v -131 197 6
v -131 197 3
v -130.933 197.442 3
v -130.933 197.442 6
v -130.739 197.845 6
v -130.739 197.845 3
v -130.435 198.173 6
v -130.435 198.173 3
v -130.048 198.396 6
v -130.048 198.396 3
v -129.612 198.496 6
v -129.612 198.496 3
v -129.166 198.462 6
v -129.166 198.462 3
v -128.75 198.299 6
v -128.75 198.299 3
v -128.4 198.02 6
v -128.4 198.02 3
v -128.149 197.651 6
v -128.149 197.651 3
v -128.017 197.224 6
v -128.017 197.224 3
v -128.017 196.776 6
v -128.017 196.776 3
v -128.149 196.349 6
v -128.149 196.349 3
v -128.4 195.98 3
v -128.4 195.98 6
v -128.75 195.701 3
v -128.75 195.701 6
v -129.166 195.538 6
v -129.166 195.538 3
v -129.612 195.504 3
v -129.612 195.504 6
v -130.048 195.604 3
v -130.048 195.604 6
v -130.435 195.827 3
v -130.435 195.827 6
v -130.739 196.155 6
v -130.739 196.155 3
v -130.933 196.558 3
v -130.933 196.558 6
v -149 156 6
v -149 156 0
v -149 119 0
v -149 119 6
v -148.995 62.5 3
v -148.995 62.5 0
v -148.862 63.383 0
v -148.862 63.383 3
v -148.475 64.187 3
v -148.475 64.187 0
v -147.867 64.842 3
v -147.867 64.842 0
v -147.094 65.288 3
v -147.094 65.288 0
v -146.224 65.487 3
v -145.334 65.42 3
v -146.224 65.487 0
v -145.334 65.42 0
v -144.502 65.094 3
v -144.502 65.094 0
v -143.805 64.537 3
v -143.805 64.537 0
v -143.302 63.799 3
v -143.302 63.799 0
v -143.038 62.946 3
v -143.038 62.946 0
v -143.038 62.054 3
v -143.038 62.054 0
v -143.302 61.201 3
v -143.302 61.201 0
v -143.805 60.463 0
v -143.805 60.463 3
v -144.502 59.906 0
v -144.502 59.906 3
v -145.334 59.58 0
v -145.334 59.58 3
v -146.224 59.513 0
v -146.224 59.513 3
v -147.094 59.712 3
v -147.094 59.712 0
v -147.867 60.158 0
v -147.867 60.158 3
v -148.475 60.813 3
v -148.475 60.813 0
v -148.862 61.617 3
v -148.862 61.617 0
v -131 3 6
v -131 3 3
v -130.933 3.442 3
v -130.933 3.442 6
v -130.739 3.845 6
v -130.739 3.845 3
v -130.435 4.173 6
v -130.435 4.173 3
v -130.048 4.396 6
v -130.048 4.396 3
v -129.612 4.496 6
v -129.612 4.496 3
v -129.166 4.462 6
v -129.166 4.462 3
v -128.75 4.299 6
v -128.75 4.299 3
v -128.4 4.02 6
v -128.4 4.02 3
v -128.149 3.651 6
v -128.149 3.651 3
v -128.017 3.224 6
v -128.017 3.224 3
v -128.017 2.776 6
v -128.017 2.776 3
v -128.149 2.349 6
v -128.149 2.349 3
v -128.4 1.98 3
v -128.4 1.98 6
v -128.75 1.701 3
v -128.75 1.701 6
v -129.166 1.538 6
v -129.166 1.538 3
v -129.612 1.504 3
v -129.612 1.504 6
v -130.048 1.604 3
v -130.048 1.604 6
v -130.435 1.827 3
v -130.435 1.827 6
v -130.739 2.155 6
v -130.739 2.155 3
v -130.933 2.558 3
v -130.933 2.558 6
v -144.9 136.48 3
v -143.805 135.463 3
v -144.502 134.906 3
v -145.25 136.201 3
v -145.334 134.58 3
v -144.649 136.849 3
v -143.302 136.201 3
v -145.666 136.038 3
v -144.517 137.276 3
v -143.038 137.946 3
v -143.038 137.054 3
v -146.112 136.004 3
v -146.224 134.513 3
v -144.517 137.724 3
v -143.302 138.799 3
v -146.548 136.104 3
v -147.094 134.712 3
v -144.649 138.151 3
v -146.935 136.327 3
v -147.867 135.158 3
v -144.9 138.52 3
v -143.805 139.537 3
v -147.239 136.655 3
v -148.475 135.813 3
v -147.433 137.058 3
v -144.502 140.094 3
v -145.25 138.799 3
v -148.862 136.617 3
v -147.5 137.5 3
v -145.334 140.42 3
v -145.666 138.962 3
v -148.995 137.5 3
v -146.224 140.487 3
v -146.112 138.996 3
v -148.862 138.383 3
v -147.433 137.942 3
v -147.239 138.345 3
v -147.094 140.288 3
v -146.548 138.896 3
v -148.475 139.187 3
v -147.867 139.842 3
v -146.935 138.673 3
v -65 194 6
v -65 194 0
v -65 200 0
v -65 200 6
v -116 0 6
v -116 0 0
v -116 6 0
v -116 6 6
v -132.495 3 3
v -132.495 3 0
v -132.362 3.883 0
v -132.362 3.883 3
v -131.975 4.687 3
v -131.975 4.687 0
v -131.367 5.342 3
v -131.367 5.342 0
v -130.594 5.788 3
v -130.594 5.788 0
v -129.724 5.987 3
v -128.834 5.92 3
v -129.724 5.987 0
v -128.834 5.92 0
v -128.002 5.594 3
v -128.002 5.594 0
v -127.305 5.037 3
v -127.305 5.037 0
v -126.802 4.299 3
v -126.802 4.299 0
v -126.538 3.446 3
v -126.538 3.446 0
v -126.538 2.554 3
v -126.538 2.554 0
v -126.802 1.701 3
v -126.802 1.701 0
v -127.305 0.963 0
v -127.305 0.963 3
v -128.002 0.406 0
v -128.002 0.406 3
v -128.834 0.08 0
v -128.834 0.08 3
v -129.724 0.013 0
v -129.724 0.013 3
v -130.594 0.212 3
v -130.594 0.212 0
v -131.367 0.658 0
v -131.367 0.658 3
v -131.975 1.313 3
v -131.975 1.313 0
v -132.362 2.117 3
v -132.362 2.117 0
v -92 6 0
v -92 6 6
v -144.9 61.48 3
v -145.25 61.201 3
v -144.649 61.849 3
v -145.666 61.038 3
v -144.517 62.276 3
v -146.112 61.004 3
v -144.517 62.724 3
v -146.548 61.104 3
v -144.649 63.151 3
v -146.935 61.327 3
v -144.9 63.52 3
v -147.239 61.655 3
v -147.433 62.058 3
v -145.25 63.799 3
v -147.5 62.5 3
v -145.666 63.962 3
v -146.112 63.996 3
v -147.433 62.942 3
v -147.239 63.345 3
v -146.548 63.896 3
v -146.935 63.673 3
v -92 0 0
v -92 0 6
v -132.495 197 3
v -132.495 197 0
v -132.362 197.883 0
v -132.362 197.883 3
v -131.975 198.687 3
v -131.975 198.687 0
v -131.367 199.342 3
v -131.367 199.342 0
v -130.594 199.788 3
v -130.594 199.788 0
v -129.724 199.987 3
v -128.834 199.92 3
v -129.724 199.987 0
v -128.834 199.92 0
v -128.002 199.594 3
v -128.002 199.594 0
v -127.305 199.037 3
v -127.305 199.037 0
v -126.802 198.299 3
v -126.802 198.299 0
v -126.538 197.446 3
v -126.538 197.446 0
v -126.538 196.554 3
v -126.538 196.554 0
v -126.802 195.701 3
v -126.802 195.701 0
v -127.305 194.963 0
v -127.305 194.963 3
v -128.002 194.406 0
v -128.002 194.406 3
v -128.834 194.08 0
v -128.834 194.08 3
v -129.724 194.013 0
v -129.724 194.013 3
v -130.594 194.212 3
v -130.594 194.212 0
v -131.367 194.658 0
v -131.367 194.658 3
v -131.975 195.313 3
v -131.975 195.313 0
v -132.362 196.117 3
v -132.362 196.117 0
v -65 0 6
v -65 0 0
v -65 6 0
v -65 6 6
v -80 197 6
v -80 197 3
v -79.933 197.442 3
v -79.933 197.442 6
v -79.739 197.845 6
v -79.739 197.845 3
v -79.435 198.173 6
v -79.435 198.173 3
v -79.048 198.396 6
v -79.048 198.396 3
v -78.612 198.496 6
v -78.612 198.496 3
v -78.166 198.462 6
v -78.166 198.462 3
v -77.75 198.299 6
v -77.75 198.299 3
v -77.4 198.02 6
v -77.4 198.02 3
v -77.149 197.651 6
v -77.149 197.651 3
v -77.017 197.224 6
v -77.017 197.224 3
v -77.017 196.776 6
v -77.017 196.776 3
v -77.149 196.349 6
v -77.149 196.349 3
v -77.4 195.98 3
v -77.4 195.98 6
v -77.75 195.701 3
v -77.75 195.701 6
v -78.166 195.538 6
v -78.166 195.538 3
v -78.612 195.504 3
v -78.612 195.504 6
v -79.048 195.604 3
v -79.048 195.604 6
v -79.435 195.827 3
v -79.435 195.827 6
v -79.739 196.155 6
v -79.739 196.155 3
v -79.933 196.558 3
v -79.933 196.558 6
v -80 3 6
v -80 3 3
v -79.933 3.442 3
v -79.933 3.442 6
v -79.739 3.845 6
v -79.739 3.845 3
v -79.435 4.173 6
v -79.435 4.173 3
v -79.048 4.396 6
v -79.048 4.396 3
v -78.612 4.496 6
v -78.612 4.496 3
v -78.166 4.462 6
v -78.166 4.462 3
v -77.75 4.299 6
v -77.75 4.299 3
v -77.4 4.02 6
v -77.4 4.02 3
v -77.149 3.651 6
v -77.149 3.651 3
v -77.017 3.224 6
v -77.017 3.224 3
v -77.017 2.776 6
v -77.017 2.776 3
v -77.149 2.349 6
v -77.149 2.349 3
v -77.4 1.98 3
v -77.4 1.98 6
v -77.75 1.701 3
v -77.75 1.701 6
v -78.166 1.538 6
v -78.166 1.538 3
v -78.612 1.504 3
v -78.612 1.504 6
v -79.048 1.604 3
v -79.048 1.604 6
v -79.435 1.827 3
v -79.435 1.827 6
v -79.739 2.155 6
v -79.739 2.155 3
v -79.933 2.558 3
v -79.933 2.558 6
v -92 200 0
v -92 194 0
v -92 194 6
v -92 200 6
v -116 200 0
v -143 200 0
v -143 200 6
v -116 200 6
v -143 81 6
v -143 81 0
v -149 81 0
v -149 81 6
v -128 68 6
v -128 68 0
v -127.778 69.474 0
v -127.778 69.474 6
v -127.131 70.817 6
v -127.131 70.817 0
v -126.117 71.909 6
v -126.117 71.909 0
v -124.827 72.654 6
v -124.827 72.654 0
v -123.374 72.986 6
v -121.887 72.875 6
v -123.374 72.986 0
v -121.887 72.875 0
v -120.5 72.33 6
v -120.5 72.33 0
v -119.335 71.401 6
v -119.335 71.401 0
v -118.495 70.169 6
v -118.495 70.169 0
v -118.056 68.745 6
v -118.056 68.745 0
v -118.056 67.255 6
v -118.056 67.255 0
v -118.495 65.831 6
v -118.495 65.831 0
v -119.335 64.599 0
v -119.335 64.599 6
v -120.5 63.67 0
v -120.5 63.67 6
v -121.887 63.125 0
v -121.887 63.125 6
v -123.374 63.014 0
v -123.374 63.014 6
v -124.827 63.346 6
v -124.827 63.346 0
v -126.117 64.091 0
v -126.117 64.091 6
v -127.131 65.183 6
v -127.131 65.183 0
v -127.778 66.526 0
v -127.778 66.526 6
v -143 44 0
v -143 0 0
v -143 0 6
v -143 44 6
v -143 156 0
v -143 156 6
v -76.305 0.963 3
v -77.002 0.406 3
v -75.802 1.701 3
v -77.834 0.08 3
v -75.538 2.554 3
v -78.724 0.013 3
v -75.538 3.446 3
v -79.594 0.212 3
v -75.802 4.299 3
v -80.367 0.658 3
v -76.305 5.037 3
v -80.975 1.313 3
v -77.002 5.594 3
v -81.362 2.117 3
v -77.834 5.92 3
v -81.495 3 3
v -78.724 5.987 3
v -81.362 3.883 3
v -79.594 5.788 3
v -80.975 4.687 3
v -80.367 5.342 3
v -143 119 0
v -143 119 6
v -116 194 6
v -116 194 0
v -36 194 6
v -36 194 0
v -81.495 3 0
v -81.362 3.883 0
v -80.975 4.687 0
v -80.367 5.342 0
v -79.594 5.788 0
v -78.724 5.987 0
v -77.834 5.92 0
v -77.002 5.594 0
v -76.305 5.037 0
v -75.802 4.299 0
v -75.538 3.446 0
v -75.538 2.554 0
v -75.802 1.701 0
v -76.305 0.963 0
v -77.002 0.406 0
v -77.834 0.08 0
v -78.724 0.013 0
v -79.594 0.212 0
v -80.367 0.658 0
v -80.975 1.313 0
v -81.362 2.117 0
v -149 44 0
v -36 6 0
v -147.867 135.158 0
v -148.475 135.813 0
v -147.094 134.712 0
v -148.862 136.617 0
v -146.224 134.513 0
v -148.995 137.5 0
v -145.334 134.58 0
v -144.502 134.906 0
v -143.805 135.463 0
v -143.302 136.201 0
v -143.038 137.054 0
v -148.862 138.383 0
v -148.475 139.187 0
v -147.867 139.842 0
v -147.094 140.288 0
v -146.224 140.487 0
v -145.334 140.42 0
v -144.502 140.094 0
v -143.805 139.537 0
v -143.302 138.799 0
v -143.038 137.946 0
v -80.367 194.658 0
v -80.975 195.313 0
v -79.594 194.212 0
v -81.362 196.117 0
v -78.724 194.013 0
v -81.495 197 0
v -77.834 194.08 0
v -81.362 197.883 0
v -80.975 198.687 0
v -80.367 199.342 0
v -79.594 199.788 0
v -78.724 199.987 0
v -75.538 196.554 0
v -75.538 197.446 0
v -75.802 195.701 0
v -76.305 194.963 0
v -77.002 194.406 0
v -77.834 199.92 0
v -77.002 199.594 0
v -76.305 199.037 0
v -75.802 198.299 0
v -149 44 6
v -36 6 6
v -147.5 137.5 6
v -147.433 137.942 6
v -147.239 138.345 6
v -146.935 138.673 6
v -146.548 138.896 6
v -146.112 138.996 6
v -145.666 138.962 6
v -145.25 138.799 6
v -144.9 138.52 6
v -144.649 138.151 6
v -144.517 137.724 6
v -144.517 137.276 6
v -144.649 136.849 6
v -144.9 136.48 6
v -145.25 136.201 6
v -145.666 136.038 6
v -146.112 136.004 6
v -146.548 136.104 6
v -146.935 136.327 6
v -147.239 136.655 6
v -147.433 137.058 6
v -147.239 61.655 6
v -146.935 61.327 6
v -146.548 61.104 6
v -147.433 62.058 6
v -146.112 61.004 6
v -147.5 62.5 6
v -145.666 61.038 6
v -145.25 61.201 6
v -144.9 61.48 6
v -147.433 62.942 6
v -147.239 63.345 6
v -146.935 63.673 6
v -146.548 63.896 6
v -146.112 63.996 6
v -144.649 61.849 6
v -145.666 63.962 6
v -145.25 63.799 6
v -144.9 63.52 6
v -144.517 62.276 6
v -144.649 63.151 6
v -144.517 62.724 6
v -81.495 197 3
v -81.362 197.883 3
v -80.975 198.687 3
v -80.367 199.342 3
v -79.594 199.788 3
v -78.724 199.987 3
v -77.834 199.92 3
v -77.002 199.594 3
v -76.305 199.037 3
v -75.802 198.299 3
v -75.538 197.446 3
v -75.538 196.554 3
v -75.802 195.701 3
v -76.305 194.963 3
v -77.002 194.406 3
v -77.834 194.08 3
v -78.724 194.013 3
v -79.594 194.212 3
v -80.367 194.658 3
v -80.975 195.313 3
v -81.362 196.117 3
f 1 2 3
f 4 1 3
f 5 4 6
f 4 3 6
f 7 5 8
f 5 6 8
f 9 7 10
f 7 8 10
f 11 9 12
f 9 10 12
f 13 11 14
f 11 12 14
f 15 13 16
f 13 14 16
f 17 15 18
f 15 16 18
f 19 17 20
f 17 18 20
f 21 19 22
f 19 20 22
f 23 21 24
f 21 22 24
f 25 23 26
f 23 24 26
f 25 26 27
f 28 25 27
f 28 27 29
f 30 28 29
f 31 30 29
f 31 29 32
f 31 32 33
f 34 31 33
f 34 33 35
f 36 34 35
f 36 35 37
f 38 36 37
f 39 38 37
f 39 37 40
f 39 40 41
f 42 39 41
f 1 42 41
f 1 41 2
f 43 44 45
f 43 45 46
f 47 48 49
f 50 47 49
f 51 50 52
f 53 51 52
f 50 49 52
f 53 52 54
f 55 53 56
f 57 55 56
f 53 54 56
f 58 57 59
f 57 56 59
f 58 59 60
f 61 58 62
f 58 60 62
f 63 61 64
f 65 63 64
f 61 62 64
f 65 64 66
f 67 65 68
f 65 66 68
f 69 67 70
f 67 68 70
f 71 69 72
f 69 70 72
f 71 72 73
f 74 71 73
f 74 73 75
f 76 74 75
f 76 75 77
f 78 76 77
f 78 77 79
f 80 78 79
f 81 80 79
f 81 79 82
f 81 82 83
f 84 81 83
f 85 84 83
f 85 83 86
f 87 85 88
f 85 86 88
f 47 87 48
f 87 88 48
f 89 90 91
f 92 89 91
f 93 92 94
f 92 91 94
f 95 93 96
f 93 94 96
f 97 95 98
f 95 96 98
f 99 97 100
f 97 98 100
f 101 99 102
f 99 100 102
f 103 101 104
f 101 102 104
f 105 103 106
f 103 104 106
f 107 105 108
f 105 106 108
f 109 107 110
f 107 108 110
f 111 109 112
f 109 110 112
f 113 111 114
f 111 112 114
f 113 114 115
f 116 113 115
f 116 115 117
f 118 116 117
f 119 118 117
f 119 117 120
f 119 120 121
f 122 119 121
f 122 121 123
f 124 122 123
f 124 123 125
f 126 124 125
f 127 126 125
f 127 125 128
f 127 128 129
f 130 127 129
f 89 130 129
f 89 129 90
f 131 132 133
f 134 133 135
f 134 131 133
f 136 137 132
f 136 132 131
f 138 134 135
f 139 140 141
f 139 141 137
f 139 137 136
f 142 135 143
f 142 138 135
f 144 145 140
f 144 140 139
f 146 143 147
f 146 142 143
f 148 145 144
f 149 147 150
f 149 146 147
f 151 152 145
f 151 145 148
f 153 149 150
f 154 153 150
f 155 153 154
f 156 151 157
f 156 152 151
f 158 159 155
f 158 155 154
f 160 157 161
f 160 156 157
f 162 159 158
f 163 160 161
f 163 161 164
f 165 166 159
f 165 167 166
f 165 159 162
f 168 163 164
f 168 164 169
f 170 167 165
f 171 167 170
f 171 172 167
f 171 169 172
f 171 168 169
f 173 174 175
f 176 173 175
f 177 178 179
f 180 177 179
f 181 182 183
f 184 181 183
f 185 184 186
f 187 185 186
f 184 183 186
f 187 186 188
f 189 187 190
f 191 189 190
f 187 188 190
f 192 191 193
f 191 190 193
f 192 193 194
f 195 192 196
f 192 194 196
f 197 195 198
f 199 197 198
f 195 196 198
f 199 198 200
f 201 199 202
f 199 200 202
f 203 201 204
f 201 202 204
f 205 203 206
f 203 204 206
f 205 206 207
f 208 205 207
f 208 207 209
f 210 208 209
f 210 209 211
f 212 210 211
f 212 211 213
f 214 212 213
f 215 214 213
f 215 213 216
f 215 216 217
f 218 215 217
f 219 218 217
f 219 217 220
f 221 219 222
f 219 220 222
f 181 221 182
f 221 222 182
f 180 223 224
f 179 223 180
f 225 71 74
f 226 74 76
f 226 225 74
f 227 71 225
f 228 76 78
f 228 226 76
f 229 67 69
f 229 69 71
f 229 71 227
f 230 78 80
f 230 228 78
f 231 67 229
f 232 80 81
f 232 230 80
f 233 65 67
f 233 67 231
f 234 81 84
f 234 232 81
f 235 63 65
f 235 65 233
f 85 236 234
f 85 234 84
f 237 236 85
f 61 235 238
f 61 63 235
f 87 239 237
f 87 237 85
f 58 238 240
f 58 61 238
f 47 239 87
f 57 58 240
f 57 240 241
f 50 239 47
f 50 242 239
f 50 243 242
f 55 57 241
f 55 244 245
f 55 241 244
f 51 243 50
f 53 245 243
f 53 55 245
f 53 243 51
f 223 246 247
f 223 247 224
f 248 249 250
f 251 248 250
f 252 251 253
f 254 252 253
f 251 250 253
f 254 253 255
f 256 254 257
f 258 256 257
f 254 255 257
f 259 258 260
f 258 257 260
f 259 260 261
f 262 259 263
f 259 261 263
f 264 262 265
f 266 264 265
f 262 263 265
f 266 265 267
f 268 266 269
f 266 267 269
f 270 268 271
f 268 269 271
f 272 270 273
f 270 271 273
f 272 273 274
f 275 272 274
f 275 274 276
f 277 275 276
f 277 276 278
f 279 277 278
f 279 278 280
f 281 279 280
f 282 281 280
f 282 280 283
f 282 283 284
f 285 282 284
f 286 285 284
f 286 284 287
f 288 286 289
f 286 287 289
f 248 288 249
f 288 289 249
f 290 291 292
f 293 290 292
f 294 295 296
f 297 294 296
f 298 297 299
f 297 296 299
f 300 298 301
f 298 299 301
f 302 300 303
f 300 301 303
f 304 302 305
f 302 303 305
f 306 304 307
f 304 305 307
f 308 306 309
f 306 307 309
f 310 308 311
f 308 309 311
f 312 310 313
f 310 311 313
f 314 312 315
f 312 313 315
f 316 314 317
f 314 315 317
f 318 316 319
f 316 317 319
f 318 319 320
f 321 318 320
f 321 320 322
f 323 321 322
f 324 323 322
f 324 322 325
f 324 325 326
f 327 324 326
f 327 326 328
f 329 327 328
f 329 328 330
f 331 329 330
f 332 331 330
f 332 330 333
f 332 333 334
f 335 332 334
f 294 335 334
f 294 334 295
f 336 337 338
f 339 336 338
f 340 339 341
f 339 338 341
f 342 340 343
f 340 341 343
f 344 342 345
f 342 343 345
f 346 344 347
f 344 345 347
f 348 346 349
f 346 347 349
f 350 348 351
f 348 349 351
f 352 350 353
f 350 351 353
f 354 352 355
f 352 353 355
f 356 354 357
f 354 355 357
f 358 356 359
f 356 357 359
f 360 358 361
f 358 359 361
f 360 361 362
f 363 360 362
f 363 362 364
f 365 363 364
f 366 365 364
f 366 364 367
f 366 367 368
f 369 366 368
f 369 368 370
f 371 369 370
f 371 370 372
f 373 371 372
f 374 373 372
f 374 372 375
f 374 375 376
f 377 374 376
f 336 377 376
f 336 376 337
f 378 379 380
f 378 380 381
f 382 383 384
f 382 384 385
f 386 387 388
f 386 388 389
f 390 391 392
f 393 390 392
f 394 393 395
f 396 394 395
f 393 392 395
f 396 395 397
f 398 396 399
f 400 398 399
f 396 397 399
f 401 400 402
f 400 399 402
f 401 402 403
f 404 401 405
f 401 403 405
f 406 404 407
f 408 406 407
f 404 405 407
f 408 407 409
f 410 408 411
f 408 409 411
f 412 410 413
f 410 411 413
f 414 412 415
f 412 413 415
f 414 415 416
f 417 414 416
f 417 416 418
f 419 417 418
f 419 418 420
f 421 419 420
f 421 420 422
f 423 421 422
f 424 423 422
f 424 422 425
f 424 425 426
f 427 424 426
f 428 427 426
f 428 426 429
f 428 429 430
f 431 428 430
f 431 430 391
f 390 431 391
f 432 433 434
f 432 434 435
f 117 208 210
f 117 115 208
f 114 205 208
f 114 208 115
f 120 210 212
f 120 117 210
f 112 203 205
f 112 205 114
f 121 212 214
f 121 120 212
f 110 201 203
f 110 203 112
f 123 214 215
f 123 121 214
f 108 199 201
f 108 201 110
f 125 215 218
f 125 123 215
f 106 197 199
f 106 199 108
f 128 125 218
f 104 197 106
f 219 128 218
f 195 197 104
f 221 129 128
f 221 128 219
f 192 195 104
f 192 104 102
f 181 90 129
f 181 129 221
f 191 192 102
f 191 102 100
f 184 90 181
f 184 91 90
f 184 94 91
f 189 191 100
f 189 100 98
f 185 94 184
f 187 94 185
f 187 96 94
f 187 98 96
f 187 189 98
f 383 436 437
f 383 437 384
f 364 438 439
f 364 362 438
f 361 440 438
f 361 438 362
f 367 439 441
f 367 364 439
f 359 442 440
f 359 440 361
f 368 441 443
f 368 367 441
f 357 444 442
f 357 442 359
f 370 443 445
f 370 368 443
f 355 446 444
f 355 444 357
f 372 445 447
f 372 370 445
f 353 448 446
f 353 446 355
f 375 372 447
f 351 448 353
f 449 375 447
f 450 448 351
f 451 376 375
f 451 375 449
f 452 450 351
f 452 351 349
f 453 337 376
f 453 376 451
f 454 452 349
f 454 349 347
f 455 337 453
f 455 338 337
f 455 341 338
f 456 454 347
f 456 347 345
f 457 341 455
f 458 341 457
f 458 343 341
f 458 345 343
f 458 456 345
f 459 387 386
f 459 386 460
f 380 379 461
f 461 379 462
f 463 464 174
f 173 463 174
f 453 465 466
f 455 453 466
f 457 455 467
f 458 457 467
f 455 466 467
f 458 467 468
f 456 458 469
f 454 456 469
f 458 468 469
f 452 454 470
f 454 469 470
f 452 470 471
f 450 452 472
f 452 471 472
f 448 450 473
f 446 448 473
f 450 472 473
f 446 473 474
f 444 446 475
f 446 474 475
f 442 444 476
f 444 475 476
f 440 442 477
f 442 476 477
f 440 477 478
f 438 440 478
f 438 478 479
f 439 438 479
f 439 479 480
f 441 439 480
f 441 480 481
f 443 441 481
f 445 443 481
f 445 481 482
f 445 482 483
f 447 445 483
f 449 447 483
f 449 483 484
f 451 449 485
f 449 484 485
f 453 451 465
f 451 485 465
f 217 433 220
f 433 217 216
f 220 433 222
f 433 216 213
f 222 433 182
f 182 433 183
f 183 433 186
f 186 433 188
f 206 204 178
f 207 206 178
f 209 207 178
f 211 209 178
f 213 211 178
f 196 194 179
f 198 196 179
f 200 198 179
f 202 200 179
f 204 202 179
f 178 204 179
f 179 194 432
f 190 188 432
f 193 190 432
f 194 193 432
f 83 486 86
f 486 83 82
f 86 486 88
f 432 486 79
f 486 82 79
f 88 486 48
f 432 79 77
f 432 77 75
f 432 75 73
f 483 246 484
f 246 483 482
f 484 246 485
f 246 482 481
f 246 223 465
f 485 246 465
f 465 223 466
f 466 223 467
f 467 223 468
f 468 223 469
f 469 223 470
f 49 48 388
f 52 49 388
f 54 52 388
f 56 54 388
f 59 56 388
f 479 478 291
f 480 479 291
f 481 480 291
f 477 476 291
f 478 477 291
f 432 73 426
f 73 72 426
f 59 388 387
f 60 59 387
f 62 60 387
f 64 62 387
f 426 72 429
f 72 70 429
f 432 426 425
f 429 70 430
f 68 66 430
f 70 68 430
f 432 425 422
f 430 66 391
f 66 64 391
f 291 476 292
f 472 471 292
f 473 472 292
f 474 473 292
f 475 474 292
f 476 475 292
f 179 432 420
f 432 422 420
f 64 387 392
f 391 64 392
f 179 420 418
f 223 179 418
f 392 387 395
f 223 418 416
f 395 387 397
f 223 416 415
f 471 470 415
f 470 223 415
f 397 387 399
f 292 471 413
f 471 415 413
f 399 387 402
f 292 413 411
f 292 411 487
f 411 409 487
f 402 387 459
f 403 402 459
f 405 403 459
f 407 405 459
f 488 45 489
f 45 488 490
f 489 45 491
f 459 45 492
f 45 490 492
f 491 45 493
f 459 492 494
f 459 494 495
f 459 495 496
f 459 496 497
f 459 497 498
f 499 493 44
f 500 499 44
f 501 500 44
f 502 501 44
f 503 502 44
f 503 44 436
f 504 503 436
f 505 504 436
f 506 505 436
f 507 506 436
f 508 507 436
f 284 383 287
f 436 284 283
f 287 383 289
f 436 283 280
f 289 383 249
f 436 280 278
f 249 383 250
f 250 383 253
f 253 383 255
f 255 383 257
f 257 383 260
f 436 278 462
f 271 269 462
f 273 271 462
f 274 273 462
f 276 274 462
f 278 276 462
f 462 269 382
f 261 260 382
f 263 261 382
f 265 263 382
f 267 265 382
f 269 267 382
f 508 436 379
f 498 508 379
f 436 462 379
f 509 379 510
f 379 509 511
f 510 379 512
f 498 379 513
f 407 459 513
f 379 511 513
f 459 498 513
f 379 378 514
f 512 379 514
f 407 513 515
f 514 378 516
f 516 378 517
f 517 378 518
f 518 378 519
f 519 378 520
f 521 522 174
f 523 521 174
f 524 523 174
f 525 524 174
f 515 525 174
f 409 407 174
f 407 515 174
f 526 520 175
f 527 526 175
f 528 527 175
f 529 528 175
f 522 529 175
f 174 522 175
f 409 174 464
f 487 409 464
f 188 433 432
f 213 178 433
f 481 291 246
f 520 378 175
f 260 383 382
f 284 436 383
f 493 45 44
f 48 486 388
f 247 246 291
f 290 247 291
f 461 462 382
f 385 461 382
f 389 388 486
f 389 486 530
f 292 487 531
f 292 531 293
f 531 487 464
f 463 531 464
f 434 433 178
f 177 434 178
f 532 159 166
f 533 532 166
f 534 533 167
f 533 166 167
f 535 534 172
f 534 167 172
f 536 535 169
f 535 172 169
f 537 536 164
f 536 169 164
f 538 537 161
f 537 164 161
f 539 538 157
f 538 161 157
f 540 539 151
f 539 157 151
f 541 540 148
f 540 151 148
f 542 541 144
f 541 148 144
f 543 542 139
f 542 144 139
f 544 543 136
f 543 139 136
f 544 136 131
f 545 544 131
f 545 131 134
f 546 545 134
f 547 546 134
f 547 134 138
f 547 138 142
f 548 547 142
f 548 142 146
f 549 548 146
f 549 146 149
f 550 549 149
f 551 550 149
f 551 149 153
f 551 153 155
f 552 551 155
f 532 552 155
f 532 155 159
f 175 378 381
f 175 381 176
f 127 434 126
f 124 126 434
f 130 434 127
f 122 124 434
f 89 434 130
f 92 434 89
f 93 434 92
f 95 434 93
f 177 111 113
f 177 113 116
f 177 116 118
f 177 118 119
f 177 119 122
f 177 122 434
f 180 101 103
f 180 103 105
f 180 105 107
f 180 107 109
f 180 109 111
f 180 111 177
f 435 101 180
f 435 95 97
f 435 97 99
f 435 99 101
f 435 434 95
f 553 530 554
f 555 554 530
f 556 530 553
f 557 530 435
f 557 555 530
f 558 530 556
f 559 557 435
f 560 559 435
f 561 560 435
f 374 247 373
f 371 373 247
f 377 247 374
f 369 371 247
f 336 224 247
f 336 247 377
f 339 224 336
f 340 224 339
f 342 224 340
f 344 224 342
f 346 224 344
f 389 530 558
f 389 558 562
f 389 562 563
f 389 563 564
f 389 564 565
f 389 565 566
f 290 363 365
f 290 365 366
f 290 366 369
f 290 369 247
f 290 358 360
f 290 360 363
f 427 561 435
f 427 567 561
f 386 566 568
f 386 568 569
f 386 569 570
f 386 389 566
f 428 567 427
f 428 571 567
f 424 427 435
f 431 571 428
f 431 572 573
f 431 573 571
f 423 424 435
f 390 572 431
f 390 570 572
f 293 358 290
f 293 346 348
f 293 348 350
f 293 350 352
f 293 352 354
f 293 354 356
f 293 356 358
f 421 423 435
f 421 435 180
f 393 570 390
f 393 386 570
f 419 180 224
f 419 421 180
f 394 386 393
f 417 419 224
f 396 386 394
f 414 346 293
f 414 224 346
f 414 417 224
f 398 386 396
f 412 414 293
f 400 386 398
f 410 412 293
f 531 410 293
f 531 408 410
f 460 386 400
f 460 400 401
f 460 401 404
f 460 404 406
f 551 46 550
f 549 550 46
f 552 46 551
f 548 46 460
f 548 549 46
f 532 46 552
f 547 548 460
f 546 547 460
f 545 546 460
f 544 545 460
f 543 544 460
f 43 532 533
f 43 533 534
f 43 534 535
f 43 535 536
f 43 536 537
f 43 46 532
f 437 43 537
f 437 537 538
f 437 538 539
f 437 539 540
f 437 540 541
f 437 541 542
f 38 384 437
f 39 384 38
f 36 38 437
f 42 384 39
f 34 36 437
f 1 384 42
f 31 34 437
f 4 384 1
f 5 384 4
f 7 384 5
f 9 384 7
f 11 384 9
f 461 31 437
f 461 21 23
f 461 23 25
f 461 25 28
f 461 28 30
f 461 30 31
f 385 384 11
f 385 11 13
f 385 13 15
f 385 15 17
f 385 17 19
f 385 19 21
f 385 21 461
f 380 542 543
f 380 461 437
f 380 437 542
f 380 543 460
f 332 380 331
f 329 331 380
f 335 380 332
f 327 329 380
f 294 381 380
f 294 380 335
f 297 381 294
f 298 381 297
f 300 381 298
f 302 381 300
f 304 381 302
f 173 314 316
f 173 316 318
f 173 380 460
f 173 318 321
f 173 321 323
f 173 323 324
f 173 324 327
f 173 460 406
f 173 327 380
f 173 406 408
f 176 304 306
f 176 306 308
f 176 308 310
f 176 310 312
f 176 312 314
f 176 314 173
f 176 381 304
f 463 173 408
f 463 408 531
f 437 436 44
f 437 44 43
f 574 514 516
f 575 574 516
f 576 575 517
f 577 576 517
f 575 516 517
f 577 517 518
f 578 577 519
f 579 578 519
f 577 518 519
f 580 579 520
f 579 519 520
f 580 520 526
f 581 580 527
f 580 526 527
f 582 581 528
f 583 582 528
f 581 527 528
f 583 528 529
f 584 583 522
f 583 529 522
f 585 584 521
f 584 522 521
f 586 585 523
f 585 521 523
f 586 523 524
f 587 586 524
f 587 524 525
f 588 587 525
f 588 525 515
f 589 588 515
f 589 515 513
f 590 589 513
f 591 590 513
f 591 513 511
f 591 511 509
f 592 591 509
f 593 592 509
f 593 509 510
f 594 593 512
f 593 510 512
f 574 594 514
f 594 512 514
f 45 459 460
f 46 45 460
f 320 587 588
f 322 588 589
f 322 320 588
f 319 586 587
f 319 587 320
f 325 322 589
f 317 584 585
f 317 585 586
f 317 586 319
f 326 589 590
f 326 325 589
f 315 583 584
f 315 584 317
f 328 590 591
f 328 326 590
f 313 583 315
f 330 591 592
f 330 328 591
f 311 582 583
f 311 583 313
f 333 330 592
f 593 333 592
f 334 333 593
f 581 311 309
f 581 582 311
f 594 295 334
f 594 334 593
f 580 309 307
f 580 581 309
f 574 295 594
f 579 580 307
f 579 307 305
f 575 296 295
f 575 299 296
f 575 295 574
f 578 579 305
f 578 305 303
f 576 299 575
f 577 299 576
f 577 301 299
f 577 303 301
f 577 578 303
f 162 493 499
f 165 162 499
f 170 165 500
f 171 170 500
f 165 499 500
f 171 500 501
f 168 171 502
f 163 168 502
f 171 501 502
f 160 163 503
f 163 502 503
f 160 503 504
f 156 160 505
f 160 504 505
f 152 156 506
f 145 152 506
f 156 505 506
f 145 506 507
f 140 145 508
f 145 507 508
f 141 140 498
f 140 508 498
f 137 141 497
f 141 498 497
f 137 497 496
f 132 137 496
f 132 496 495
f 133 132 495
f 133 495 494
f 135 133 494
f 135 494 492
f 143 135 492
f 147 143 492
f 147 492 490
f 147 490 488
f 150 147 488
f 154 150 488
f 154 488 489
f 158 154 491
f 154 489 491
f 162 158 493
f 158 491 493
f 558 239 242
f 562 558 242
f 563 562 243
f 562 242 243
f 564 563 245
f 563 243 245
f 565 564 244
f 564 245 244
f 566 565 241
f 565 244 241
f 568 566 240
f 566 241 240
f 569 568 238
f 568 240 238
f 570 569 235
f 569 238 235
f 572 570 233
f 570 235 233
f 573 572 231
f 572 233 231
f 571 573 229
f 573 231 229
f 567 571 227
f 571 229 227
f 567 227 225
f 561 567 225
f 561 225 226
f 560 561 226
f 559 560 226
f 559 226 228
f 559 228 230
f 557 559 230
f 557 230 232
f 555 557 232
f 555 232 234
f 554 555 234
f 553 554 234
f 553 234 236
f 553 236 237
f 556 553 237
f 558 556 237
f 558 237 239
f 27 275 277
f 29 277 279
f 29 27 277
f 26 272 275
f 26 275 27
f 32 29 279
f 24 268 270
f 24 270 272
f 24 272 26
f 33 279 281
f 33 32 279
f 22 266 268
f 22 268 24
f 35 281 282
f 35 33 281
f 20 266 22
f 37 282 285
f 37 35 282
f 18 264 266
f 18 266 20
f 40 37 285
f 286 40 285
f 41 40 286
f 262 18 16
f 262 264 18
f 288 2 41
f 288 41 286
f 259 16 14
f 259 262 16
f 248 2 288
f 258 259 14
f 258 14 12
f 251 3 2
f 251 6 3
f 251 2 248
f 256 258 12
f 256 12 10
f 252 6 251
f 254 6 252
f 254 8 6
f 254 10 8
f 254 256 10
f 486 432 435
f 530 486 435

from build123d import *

# Parameters (mm, degrees)
ESQUISSE1_W             = 143
ESQUISSE1_H             = 200
BOSS_EXTRU_1_DEPTH      = 6
ESQUISSE2_W             = 6
ESQUISSE2_H             = 30
ESQUISSE2_W_2           = 29
ESQUISSE2_H_2           = 6
ESQUISSE2_W_3           = 24
ENL_V_MAT_EXTRU_1_DEPTH = 6
ESQUISSE3_W             = 6
ESQUISSE3_H             = 37
BOSS_EXTRU_2_DEPTH      = 6
ESQUISSE4_W             = 36
ESQUISSE4_H             = 200
ENL_V_MAT_EXTRU_2_DEPTH = 10
ESQUISSE5_R             = 2.995
ENL_V_MAT_EXTRU_3_DEPTH = 3
ESQUISSE6_R             = 1.5
ENL_V_MAT_EXTRU_4_DEPTH = 6
ESQUISSE7_R             = 5
ENL_V_MAT_EXTRU_5_DEPTH = 10


with BuildPart() as part:
    # Esquisse1 → Boss.-Extru.1 (new body)
    with BuildSketch(Plane.XY):
        with Locations((-71.5, 100)):
            Rectangle(ESQUISSE1_W, ESQUISSE1_H)
    extrude(amount=BOSS_EXTRU_1_DEPTH)

    # Esquisse2 → Enlèv. mat.-Extru.1 (cut)
    with BuildSketch(Plane(origin=(0, 0, 0), x_dir=(-1, 0, 0), z_dir=(0, 0, -1))):
        with Locations((3, 65)):
            Rectangle(ESQUISSE2_W, ESQUISSE2_H)
        with Locations((3, 135)):
            Rectangle(ESQUISSE2_W, ESQUISSE2_H)
        with Locations((50.5, 3)):
            Rectangle(ESQUISSE2_W_2, ESQUISSE2_H_2)
        with Locations((104, 3)):
            Rectangle(ESQUISSE2_W_3, ESQUISSE2_H_2)
        with Locations((50.5, 197)):
            Rectangle(ESQUISSE2_W_2, ESQUISSE2_H_2)
        with Locations((104, 197)):
            Rectangle(ESQUISSE2_W_3, ESQUISSE2_H_2)
    extrude(amount=-ENL_V_MAT_EXTRU_1_DEPTH, mode=Mode.SUBTRACT)

    # Esquisse3 → Boss.-Extru.2 (add)
    with BuildSketch(Plane.ZY.offset(143)):
        with Locations((3, 62.5)):
            Rectangle(ESQUISSE3_W, ESQUISSE3_H)
        with Locations((3, 137.5)):
            Rectangle(ESQUISSE3_W, ESQUISSE3_H)
    extrude(amount=BOSS_EXTRU_2_DEPTH)

    # Esquisse4 → Enlèv. mat.-Extru.2 (cut)
    with BuildSketch(Plane(origin=(0, 0, 0), x_dir=(-1, 0, 0), z_dir=(0, 0, -1))):
        with Locations((18, 100)):
            Rectangle(ESQUISSE4_W, ESQUISSE4_H)
    extrude(amount=-ENL_V_MAT_EXTRU_2_DEPTH, mode=Mode.SUBTRACT)

    # Esquisse5 → Enlèv. mat.-Extru.3 (cut)
    with BuildSketch(Plane(origin=(0, 0, 0), x_dir=(-1, 0, 0), z_dir=(0, 0, -1))):
        with Locations((78.5, 3)):
            Circle(ESQUISSE5_R)
        with Locations((129.5, 3)):
            Circle(ESQUISSE5_R)
        with Locations((78.5, 197)):
            Circle(ESQUISSE5_R)
        with Locations((129.5, 197)):
            Circle(ESQUISSE5_R)
        with Locations((146, 62.5)):
            Circle(ESQUISSE5_R)
        with Locations((146, 137.5)):
            Circle(ESQUISSE5_R)
    extrude(amount=-ENL_V_MAT_EXTRU_3_DEPTH, mode=Mode.SUBTRACT)

    # Esquisse6 → Enlèv. mat.-Extru.4 (cut)
    with BuildSketch(Plane(origin=(0, 0, 0), x_dir=(-1, 0, 0), z_dir=(0, 0, -1))):
        with Locations((78.5, 3)):
            Circle(ESQUISSE6_R)
        with Locations((129.5, 3)):
            Circle(ESQUISSE6_R)
        with Locations((78.5, 197)):
            Circle(ESQUISSE6_R)
        with Locations((129.5, 197)):
            Circle(ESQUISSE6_R)
        with Locations((146, 62.5)):
            Circle(ESQUISSE6_R)
        with Locations((146, 137.5)):
            Circle(ESQUISSE6_R)
    extrude(amount=-ENL_V_MAT_EXTRU_4_DEPTH, mode=Mode.SUBTRACT)

    # Esquisse7 → Enlèv. mat.-Extru.5 (cut)
    with BuildSketch(Plane(origin=(0, 0, 0), x_dir=(-1, 0, 0), z_dir=(0, 0, -1))):
        with Locations((123, 68)):
            Circle(ESQUISSE7_R)
    extrude(amount=-ENL_V_MAT_EXTRU_5_DEPTH, mode=Mode.SUBTRACT)


solid = part.part
